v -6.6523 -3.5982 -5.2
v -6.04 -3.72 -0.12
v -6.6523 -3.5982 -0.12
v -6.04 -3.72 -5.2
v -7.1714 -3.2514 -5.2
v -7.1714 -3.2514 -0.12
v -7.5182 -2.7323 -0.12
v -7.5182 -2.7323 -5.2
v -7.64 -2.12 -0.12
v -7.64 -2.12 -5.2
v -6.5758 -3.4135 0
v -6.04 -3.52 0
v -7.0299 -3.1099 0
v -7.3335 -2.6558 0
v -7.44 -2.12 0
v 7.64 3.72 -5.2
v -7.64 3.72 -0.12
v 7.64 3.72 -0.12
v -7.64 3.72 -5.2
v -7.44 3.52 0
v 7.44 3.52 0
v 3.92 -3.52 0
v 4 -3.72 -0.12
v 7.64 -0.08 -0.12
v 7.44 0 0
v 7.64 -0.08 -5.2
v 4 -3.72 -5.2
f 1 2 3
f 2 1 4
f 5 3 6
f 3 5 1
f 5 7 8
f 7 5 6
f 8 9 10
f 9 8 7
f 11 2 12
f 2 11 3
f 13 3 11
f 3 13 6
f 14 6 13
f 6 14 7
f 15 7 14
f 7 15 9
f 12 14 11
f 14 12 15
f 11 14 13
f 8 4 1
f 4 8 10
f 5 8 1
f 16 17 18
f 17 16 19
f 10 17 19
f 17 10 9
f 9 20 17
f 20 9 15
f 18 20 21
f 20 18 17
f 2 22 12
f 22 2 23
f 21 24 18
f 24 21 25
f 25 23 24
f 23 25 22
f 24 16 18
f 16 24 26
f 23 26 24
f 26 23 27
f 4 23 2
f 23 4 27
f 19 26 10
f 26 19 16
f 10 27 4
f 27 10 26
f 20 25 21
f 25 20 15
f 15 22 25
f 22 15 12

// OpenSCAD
// file: ../p/1-4cyli.scad
use <../lib.scad>
function ldraw_lib__1_4cyli() = [
// 0 Cylinder 0.25
// 0 Name: 1-4cyli.dat
// 0 Author: James Jessiman
// 0 !LDRAW_ORG Primitive UPDATE 2012-01
// 0 !LICENSE Licensed under CC BY 4.0 : see CAreadme.txt
// 
// 0 BFC CERTIFY CCW
  [0,"BFC","CERTIFY"],
  [0,"BFC","CCW"],
// 
// 0 !HISTORY 2002-03-23 [sbliss] Added BFC statement.
// 0 !HISTORY 2002-04-25 [PTadmin] Official Update 2002-02
// 0 !HISTORY 2007-06-22 [PTadmin] Header formatted for Contributor Agreement
// 0 !HISTORY 2008-07-01 [PTadmin] Official Update 2008-01
// 0 !HISTORY 2012-02-16 [Philo] Changed to CCW
// 0 !HISTORY 2012-03-30 [PTadmin] Official Update 2012-01
// 
// 
// 4 16 1 1 0 0.9239 1 0.3827 0.9239 0 0.3827 1 0 0
  [4,16,1,1,0,0.9239,1,0.3827,0.9239,0,0.3827,1,0,0],
// 5 24 1 0 0 1 1 0 0.9239 0 0.3827 1 0 -1
  [5,24,1,0,0,1,1,0,0.9239,0,0.3827,1,0,-1],
// 4 16 0.9239 1 0.3827 0.7071 1 0.7071 0.7071 0 0.7071 0.9239 0 0.3827
  [4,16,0.9239,1,0.3827,0.7071,1,0.7071,0.7071,0,0.7071,0.9239,0,0.3827],
// 5 24 0.9239 0 0.3827 0.9239 1 0.3827 0.7071 0 0.7071 1 0 0
  [5,24,0.9239,0,0.3827,0.9239,1,0.3827,0.7071,0,0.7071,1,0,0],
// 4 16 0.7071 1 0.7071 0.3827 1 0.9239 0.3827 0 0.9239 0.7071 0 0.7071
  [4,16,0.7071,1,0.7071,0.3827,1,0.9239,0.3827,0,0.9239,0.7071,0,0.7071],
// 5 24 0.7071 0 0.7071 0.7071 1 0.7071 0.3827 0 0.9239 0.9239 0 0.3827
  [5,24,0.7071,0,0.7071,0.7071,1,0.7071,0.3827,0,0.9239,0.9239,0,0.3827],
// 4 16 0.3827 1 0.9239 0 1 1 0 0 1 0.3827 0 0.9239
  [4,16,0.3827,1,0.9239,0,1,1,0,0,1,0.3827,0,0.9239],
// 5 24 0.3827 0 0.9239 0.3827 1 0.9239 0 0 1 0.7071 0 0.7071
  [5,24,0.3827,0,0.9239,0.3827,1,0.9239,0,0,1,0.7071,0,0.7071],
// 5 24 0 0 1 0 1 1 0.3827 0 0.9239 -1 0 1
  [5,24,0,0,1,0,1,1,0.3827,0,0.9239,-1,0,1],
];
module ldraw_lib__1_4cyli(step=0, col=false, unit=2/5, alt=false, line=0.2, solid=!$preview)
    makepoly(ldraw_lib__1_4cyli(), step=step, col=col, unit=unit, alt=alt, line=line, solid=solid);
ldraw_lib__1_4cyli(line=0.2);
// file: ../p/rect3.scad
use <../lib.scad>
function ldraw_lib__rect3() = [
// 0 Rectangle with 3 Edges
// 0 Name: rect3.dat
// 0 Author: Mark Kennedy [mkennedy]
// 0 !LDRAW_ORG Primitive UPDATE 2010-01
// 0 !LICENSE Licensed under CC BY 4.0 : see CAreadme.txt
// 
// 0 BFC CERTIFY CCW
  [0,"BFC","CERTIFY"],
  [0,"BFC","CCW"],
// 
// 0 !HISTORY 2003-08-01 [PTadmin] Official Update 2003-02
// 0 !HISTORY 2007-06-24 [PTadmin] Header formatted for Contributor Agreement
// 0 !HISTORY 2008-07-01 [PTadmin] Official Update 2008-01
// 0 !HISTORY 2010-01-17 [mikeheide] Change winding to CCW
// 0 !HISTORY 2010-04-05 [PTadmin] Official Update 2010-01
// 
// 
// 2 24 1 0 1 -1 0 1
  [2,24,1,0,1,-1,0,1],
// 2 24 1 0 1 1 0 -1
  [2,24,1,0,1,1,0,-1],
// 2 24 -1 0 1 -1 0 -1
  [2,24,-1,0,1,-1,0,-1],
// 4 16 -1 0 1 -1 0 -1 1 0 -1 1 0 1
  [4,16,-1,0,1,-1,0,-1,1,0,-1,1,0,1],
// 0 //
];
module ldraw_lib__rect3(step=0, col=false, unit=2/5, alt=false, line=0.2, solid=!$preview)
    makepoly(ldraw_lib__rect3(), step=step, col=col, unit=unit, alt=alt, line=line, solid=solid);
ldraw_lib__rect3(line=0.2);
// file: ../p/rect2p.scad
use <../lib.scad>
function ldraw_lib__rect2p() = [
// 0 Rectangle with 2 Parallel Edges
// 0 Name: rect2p.dat
// 0 Author: Donald Sutter [technog]
// 0 !LDRAW_ORG Primitive UPDATE 2010-01
// 0 !LICENSE Licensed under CC BY 4.0 : see CAreadme.txt
// 
// 0 BFC CERTIFY CCW
  [0,"BFC","CERTIFY"],
  [0,"BFC","CCW"],
// 
// 0 !HISTORY 2003-08-01 [PTadmin] Official Update 2003-02
// 0 !HISTORY 2007-06-24 [PTadmin] Header formatted for Contributor Agreement
// 0 !HISTORY 2008-07-01 [PTadmin] Official Update 2008-01
// 0 !HISTORY 2010-01-17 [mikeheide] changed winding to CCW
// 0 !HISTORY 2010-04-05 [PTadmin] Official Update 2010-01
// 
// 
// 2 24 1 0 1 -1 0 1
  [2,24,1,0,1,-1,0,1],
// 2 24 -1 0 -1 1 0 -1
  [2,24,-1,0,-1,1,0,-1],
// 4 16 -1 0 1 -1 0 -1 1 0 -1 1 0 1
  [4,16,-1,0,1,-1,0,-1,1,0,-1,1,0,1],
// 0
];
module ldraw_lib__rect2p(step=0, col=false, unit=2/5, alt=false, line=0.2, solid=!$preview)
    makepoly(ldraw_lib__rect2p(), step=step, col=col, unit=unit, alt=alt, line=line, solid=solid);
ldraw_lib__rect2p(line=0.2);
// file: ../p/rect.scad
use <../lib.scad>
function ldraw_lib__rect() = [
// 0 Rectangle
// 0 Name: rect.dat
// 0 Author: James Jessiman
// 0 !LDRAW_ORG Primitive UPDATE 2010-01
// 0 !LICENSE Licensed under CC BY 2.0 and CC BY 4.0 : see CAreadme.txt
// 
// 0 BFC CERTIFY CCW
  [0,"BFC","CERTIFY"],
  [0,"BFC","CCW"],
// 
// 0 !HISTORY 2002-04-05 [hafhead] Added BFC statement
// 0 !HISTORY 2002-04-25 [PTadmin] Official Update 2002-02
// 0 !HISTORY 2007-06-24 [PTadmin] Header formatted for Contributor Agreement
// 0 !HISTORY 2008-07-01 [PTadmin] Official Update 2008-01
// 0 !HISTORY 2010-01-17 [mikeheide] changed winding to CCW
// 0 !HISTORY 2010-04-05 [PTadmin] Official Update 2010-01
// 
// 
// 2 24 1 0 1 -1 0 1
  [2,24,1,0,1,-1,0,1],
// 2 24 -1 0 1 -1 0 -1
  [2,24,-1,0,1,-1,0,-1],
// 2 24 -1 0 -1 1 0 -1
  [2,24,-1,0,-1,1,0,-1],
// 2 24 1 0 -1 1 0 1
  [2,24,1,0,-1,1,0,1],
// 4 16 -1 0 1 -1 0 -1 1 0 -1 1 0 1
  [4,16,-1,0,1,-1,0,-1,1,0,-1,1,0,1],
// 0
];
module ldraw_lib__rect(step=0, col=false, unit=2/5, alt=false, line=0.2, solid=!$preview)
    makepoly(ldraw_lib__rect(), step=step, col=col, unit=unit, alt=alt, line=line, solid=solid);
ldraw_lib__rect(line=0.2);
// file: ../p/1-4edge.scad
use <../lib.scad>
function ldraw_lib__1_4edge() = [
// 0 Circle 0.25
// 0 Name: 1-4edge.dat
// 0 Author: James Jessiman
// 0 !LDRAW_ORG Primitive UPDATE 2017-01
// 0 !LICENSE Licensed under CC BY 4.0 : see CAreadme.txt
// 
// 0 BFC CERTIFY CCW
  [0,"BFC","CERTIFY"],
  [0,"BFC","CCW"],
// 
// 0 !HISTORY 2007-06-22 [PTadmin] Header formatted for Contributor Agreement
// 0 !HISTORY 2008-07-01 [PTadmin] Official Update 2008-01
// 0 !HISTORY 2017-01-15 [Steffen] BFCed
// 0 !HISTORY 2017-12-30 [PTadmin] Official Update 2017-01
// 
// 
// 2 24 1 0 0 0.9239 0 0.3827
  [2,24,1,0,0,0.9239,0,0.3827],
// 2 24 0.9239 0 0.3827 0.7071 0 0.7071
  [2,24,0.9239,0,0.3827,0.7071,0,0.7071],
// 2 24 0.7071 0 0.7071 0.3827 0 0.9239
  [2,24,0.7071,0,0.7071,0.3827,0,0.9239],
// 2 24 0.3827 0 0.9239 0 0 1
  [2,24,0.3827,0,0.9239,0,0,1],
];
module ldraw_lib__1_4edge(step=0, col=false, unit=2/5, alt=false, line=0.2, solid=!$preview)
    makepoly(ldraw_lib__1_4edge(), step=step, col=col, unit=unit, alt=alt, line=line, solid=solid);
ldraw_lib__1_4edge(line=0.2);
// file: ../p/1-4cylo.scad
use <../lib.scad>
use <1-4cyli.scad>
use <1-4edge.scad>
function ldraw_lib__1_4cylo() = [
// 0 Cylinder Open 0.25
// 0 Name: 1-4cylo.dat
// 0 Author: Max Martin Richter [MMR1988]
// 0 !LDRAW_ORG Primitive UPDATE 2010-03
// 0 !LICENSE Licensed under CC BY 4.0 : see CAreadme.txt
// 
// 0 BFC CERTIFY CCW
  [0,"BFC","CERTIFY"],
  [0,"BFC","CCW"],
// 
// 0 !HISTORY 2010-12-31 [PTadmin] Official Update 2010-03
// 
// 
// 1 16 0 0 0 1 0 0 0 1 0 0 0 1 1-4edge.dat
  [1,16,0,0,0,1,0,0,0,1,0,0,0,1, ldraw_lib__1_4edge()],
// 1 16 0 1 0 1 0 0 0 1 0 0 0 1 1-4edge.dat
  [1,16,0,1,0,1,0,0,0,1,0,0,0,1, ldraw_lib__1_4edge()],
// 1 16 0 0 0 1 0 0 0 1 0 0 0 1 1-4cyli.dat
  [1,16,0,0,0,1,0,0,0,1,0,0,0,1, ldraw_lib__1_4cyli()],
];
module ldraw_lib__1_4cylo(step=0, col=false, unit=2/5, alt=false, line=0.2, solid=!$preview)
    makepoly(ldraw_lib__1_4cylo(), step=step, col=col, unit=unit, alt=alt, line=line, solid=solid);
ldraw_lib__1_4cylo(line=0.2);
// file: ../p/1-4con7.scad
use <../lib.scad>
function ldraw_lib__1_4con7() = [
// 0 Cone  7 x 0.25
// 0 Name: 1-4con7.dat
// 0 Author: Franklin W. Cain [fwcain]
// 0 !LDRAW_ORG Primitive UPDATE 2012-01
// 0 !LICENSE Licensed under CC BY 2.0 and CC BY 4.0 : see CAreadme.txt
// 
// 0 BFC CERTIFY CCW
  [0,"BFC","CERTIFY"],
  [0,"BFC","CCW"],
// 
// 0 !HISTORY 2002-09-21 [cwdee] Made BFC compliant
// 0 !HISTORY 2002-12-31 [PTadmin] Official Update 2002-06
// 0 !HISTORY 2007-06-22 [PTadmin] Header formatted for Contributor Agreement
// 0 !HISTORY 2008-07-01 [PTadmin] Official Update 2008-01
// 0 !HISTORY 2012-02-16 [Philo] Recreated CCW
// 0 !HISTORY 2012-03-30 [PTadmin] Official Update 2012-01
// 
// 
// 4 16 7 1 0 6.4673 1 2.6789 7.3912 0 3.0616 8 0 0
  [4,16,7,1,0,6.4673,1,2.6789,7.3912,0,3.0616,8,0,0],
// 4 16 6.4673 1 2.6789 4.9497 1 4.9497 5.6568 0 5.6568 7.3912 0 3.0616
  [4,16,6.4673,1,2.6789,4.9497,1,4.9497,5.6568,0,5.6568,7.3912,0,3.0616],
// 4 16 4.9497 1 4.9497 2.6789 1 6.4673 3.0616 0 7.3912 5.6568 0 5.6568
  [4,16,4.9497,1,4.9497,2.6789,1,6.4673,3.0616,0,7.3912,5.6568,0,5.6568],
// 4 16 2.6789 1 6.4673 0 1 7 0 0 8 3.0616 0 7.3912
  [4,16,2.6789,1,6.4673,0,1,7,0,0,8,3.0616,0,7.3912],
// 0 // conditional lines
// 5 24 7 1 0 8 0 0 7 1 -2.8995 6.4672 1 2.6788
  [5,24,7,1,0,8,0,0,7,1,-2.8995,6.4672,1,2.6788],
// 5 24 6.4673 1 2.6789 7.3912 0 3.0616 7 1 0 4.9497 1 4.9497
  [5,24,6.4673,1,2.6789,7.3912,0,3.0616,7,1,0,4.9497,1,4.9497],
// 5 24 4.9497 1 4.9497 5.6568 0 5.6568 6.4672 1 2.6788 2.6788 1 6.4672
  [5,24,4.9497,1,4.9497,5.6568,0,5.6568,6.4672,1,2.6788,2.6788,1,6.4672],
// 5 24 2.6789 1 6.4673 3.0616 0 7.3912 4.9497 1 4.9497 0 1 7
  [5,24,2.6789,1,6.4673,3.0616,0,7.3912,4.9497,1,4.9497,0,1,7],
// 5 24 0 1 7 0 0 8 2.6788 1 6.4672 -2.8995 1 7
  [5,24,0,1,7,0,0,8,2.6788,1,6.4672,-2.8995,1,7],
// 0 // Build by Primitive Generator 2
];
module ldraw_lib__1_4con7(step=0, col=false, unit=2/5, alt=false, line=0.2, solid=!$preview)
    makepoly(ldraw_lib__1_4con7(), step=step, col=col, unit=unit, alt=alt, line=line, solid=solid);
ldraw_lib__1_4con7(line=0.2);
// file: ../p/1-4chrd.scad
use <../lib.scad>
function ldraw_lib__1_4chrd() = [
// 0 Chord 0.25
// 0 Name: 1-4chrd.dat
// 0 Author: Tony Hafner [hafhead]
// 0 !LDRAW_ORG Primitive UPDATE 2012-02
// 0 !LICENSE Licensed under CC BY 2.0 and CC BY 4.0 : see CAreadme.txt
// 
// 0 BFC CERTIFY CCW
  [0,"BFC","CERTIFY"],
  [0,"BFC","CCW"],
// 
// 0 !HISTORY 2004-04-22 [PTadmin] Official Update 2004-02
// 0 !HISTORY 2007-10-09 [PTadmin] Header formatted for Contributor Agreement
// 0 !HISTORY 2008-07-01 [PTadmin] Official Update 2008-01
// 0 !HISTORY 2012-08-02 [MMR1988] Re-creation with PrimGen2 and Rectifier
// 0 !HISTORY 2012-08-09 [PTadmin] Official Update 2012-02
// 
// 
// 4 16 0.9239 0 0.3827 0.3827 0 0.9239 0 0 1 1 0 0
  [4,16,0.9239,0,0.3827,0.3827,0,0.9239,0,0,1,1,0,0],
// 3 16 0.7071 0 0.7071 0.3827 0 0.9239 0.9239 0 0.3827
  [3,16,0.7071,0,0.7071,0.3827,0,0.9239,0.9239,0,0.3827],
];
module ldraw_lib__1_4chrd(step=0, col=false, unit=2/5, alt=false, line=0.2, solid=!$preview)
    makepoly(ldraw_lib__1_4chrd(), step=step, col=col, unit=unit, alt=alt, line=line, solid=solid);
ldraw_lib__1_4chrd(line=0.2);
// main file
use <../lib.scad>
use <../p/1-4chrd.scad>
use <../p/1-4con7.scad>
use <../p/1-4cylo.scad>
use <../p/1-4edge.scad>
use <../p/rect.scad>
use <../p/rect2p.scad>
use <../p/rect3.scad>
function ldraw_lib__11030() = [
// 0 ~Electric Mindstorms EV3 Rectangular Button with Cut Corner
// 0 Name: 11030.dat
// 0 Author: Philippe Hurbain [Philo]
// 0 !LDRAW_ORG Part UPDATE 2013-02
// 0 !LICENSE Licensed under CC BY 4.0 : see CAreadme.txt
// 
// 0 BFC CERTIFY CCW
  [0,"BFC","CERTIFY"],
  [0,"BFC","CCW"],
// 
// 0 !HISTORY 2012-05-20 {LEGO MINDSTORMS Team} Original part shape
// 0 !HISTORY 2012-06-15 [Philo] Complete rebuild for LDraw Parts Tracker
// 0 !HISTORY 2013-12-23 [PTadmin] Official Update 2013-02
// 
// 
// 1 16 -15.1 0.3 -5.3 0 0 -4 0 12.7 0 -4 0 0 1-4cylo.dat
  [1,16,-15.1,0.3,-5.3,0,0,-4,0,12.7,0,-4,0,0, ldraw_lib__1_4cylo()],
// 1 16 -15.1 0 -5.3 0 0 -3.5 0 0.3 0 -3.5 0 0 1-4edge.dat
  [1,16,-15.1,0,-5.3,0,0,-3.5,0,0.3,0,-3.5,0,0, ldraw_lib__1_4edge()],
// 1 16 -15.1 0.3 -5.3 0 0 -0.5 0 -0.3 0 -0.5 0 0 1-4con7.dat
  [1,16,-15.1,0.3,-5.3,0,0,-0.5,0,-0.3,0,-0.5,0,0, ldraw_lib__1_4con7()],
// 1 16 -15.1 0 -5.3 0 0 -3.5 0 0.3 0 -3.5 0 0 1-4chrd.dat
  [1,16,-15.1,0,-5.3,0,0,-3.5,0,0.3,0,-3.5,0,0, ldraw_lib__1_4chrd()],
// 1 16 -15.1 13 -5.3 0 0 -4 0 -1 0 -4 0 0 1-4chrd.dat
  [1,16,-15.1,13,-5.3,0,0,-4,0,-1,0,-4,0,0, ldraw_lib__1_4chrd()],
// 2 24 -18.6 0 -5.3 -18.6 0 8.8
  [2,24,-18.6,0,-5.3,-18.6,0,8.8],
// 2 24 18.6 0 8.8 -18.6 0 8.8
  [2,24,18.6,0,8.8,-18.6,0,8.8],
// 2 24 18.6 0 8.8 18.6 0 0
  [2,24,18.6,0,8.8,18.6,0,0],
// 2 24 9.8 0 -8.8 18.6 0 0
  [2,24,9.8,0,-8.8,18.6,0,0],
// 2 24 9.8 0 -8.8 -15.1 0 -8.8
  [2,24,9.8,0,-8.8,-15.1,0,-8.8],
// 1 16 0 6.65 9.3 19.1 0 0 0 0 6.35 0 -1 0 rect.dat
  [1,16,0,6.65,9.3,19.1,0,0,0,0,6.35,0,-1,0, ldraw_lib__rect()],
// 1 16 -19.1 6.65 2 0 1 0 0 0 6.35 -7.3 0 0 rect2p.dat
  [1,16,-19.1,6.65,2,0,1,0,0,0,6.35,-7.3,0,0, ldraw_lib__rect2p()],
// 4 16 -19.1 0.3 -5.3 -18.6 0 -5.3 -18.6 0 8.8 -19.1 0.3 9.3
  [4,16,-19.1,0.3,-5.3,-18.6,0,-5.3,-18.6,0,8.8,-19.1,0.3,9.3],
// 4 16 -19.1 0.3 9.3 -18.6 0 8.8 18.6 0 8.8 19.1 0.3 9.3
  [4,16,-19.1,0.3,9.3,-18.6,0,8.8,18.6,0,8.8,19.1,0.3,9.3],
// 4 16 10 0.3 -9.3 9.8 0 -8.8 -15.1 0 -8.8 -15.1 0.3 -9.3
  [4,16,10,0.3,-9.3,9.8,0,-8.8,-15.1,0,-8.8,-15.1,0.3,-9.3],
// 4 16 19.1 0.3 9.3 18.6 0 8.8 18.6 0 0 19.1 0.3 -0.2
  [4,16,19.1,0.3,9.3,18.6,0,8.8,18.6,0,0,19.1,0.3,-0.2],
// 4 16 19.1 0.3 -0.2 18.6 0 0 9.8 0 -8.8 10 0.3 -9.3
  [4,16,19.1,0.3,-0.2,18.6,0,0,9.8,0,-8.8,10,0.3,-9.3],
// 5 24 -19.1 0.3 9.3 -18.6 0 8.8 -18.6 0 -5.3 19.1 0.3 9.3
  [5,24,-19.1,0.3,9.3,-18.6,0,8.8,-18.6,0,-5.3,19.1,0.3,9.3],
// 5 24 19.1 0.3 9.3 18.6 0 8.8 -18.6 0 8.8 19.1 0.3 -0.2
  [5,24,19.1,0.3,9.3,18.6,0,8.8,-18.6,0,8.8,19.1,0.3,-0.2],
// 5 24 9.8 0 -8.8 10 0.3 -9.3 -15.1 0.3 -9.3 18.6 0 0
  [5,24,9.8,0,-8.8,10,0.3,-9.3,-15.1,0.3,-9.3,18.6,0,0],
// 5 24 19.1 0.3 -0.2 18.6 0 0 18.6 0 8.8 10 0.3 -9.3
  [5,24,19.1,0.3,-0.2,18.6,0,0,18.6,0,8.8,10,0.3,-9.3],
// 1 16 19.1 6.65 4.55 0 -1 0 -6.35 0 0 0 0 -4.75 rect3.dat
  [1,16,19.1,6.65,4.55,0,-1,0,-6.35,0,0,0,0,-4.75, ldraw_lib__rect3()],
// 1 16 14.55 6.65 -4.75 0 -1 -4.55 -6.35 0 0 0 1 -4.55 rect3.dat
  [1,16,14.55,6.65,-4.75,0,-1,-4.55,-6.35,0,0,0,1,-4.55, ldraw_lib__rect3()],
// 1 16 -2.55 6.65 -9.3 -12.55 0 0 0 0 6.35 0 1 0 rect2p.dat
  [1,16,-2.55,6.65,-9.3,-12.55,0,0,0,0,6.35,0,1,0, ldraw_lib__rect2p()],
// 4 16 19.1 13 -0.2 -19.1 13 -5.3 -19.1 13 9.3 19.1 13 9.3
  [4,16,19.1,13,-0.2,-19.1,13,-5.3,-19.1,13,9.3,19.1,13,9.3],
// 4 16 10 13 -9.3 -15.1 13 -9.3 -19.1 13 -5.3 19.1 13 -0.2
  [4,16,10,13,-9.3,-15.1,13,-9.3,-19.1,13,-5.3,19.1,13,-0.2],
// 4 16 18.6 0 8.8 -18.6 0 8.8 -18.6 0 -5.3 18.6 0 0
  [4,16,18.6,0,8.8,-18.6,0,8.8,-18.6,0,-5.3,18.6,0,0],
// 4 16 18.6 0 0 -18.6 0 -5.3 -15.1 0 -8.8 9.8 0 -8.8
  [4,16,18.6,0,0,-18.6,0,-5.3,-15.1,0,-8.8,9.8,0,-8.8],
];
module ldraw_lib__11030(step=0, col=false, unit=2/5, alt=false, line=0.2, solid=!$preview)
    makepoly(ldraw_lib__11030(), step=step, col=col, unit=unit, alt=alt, line=line, solid=solid);
ldraw_lib__11030(line=0.2);
